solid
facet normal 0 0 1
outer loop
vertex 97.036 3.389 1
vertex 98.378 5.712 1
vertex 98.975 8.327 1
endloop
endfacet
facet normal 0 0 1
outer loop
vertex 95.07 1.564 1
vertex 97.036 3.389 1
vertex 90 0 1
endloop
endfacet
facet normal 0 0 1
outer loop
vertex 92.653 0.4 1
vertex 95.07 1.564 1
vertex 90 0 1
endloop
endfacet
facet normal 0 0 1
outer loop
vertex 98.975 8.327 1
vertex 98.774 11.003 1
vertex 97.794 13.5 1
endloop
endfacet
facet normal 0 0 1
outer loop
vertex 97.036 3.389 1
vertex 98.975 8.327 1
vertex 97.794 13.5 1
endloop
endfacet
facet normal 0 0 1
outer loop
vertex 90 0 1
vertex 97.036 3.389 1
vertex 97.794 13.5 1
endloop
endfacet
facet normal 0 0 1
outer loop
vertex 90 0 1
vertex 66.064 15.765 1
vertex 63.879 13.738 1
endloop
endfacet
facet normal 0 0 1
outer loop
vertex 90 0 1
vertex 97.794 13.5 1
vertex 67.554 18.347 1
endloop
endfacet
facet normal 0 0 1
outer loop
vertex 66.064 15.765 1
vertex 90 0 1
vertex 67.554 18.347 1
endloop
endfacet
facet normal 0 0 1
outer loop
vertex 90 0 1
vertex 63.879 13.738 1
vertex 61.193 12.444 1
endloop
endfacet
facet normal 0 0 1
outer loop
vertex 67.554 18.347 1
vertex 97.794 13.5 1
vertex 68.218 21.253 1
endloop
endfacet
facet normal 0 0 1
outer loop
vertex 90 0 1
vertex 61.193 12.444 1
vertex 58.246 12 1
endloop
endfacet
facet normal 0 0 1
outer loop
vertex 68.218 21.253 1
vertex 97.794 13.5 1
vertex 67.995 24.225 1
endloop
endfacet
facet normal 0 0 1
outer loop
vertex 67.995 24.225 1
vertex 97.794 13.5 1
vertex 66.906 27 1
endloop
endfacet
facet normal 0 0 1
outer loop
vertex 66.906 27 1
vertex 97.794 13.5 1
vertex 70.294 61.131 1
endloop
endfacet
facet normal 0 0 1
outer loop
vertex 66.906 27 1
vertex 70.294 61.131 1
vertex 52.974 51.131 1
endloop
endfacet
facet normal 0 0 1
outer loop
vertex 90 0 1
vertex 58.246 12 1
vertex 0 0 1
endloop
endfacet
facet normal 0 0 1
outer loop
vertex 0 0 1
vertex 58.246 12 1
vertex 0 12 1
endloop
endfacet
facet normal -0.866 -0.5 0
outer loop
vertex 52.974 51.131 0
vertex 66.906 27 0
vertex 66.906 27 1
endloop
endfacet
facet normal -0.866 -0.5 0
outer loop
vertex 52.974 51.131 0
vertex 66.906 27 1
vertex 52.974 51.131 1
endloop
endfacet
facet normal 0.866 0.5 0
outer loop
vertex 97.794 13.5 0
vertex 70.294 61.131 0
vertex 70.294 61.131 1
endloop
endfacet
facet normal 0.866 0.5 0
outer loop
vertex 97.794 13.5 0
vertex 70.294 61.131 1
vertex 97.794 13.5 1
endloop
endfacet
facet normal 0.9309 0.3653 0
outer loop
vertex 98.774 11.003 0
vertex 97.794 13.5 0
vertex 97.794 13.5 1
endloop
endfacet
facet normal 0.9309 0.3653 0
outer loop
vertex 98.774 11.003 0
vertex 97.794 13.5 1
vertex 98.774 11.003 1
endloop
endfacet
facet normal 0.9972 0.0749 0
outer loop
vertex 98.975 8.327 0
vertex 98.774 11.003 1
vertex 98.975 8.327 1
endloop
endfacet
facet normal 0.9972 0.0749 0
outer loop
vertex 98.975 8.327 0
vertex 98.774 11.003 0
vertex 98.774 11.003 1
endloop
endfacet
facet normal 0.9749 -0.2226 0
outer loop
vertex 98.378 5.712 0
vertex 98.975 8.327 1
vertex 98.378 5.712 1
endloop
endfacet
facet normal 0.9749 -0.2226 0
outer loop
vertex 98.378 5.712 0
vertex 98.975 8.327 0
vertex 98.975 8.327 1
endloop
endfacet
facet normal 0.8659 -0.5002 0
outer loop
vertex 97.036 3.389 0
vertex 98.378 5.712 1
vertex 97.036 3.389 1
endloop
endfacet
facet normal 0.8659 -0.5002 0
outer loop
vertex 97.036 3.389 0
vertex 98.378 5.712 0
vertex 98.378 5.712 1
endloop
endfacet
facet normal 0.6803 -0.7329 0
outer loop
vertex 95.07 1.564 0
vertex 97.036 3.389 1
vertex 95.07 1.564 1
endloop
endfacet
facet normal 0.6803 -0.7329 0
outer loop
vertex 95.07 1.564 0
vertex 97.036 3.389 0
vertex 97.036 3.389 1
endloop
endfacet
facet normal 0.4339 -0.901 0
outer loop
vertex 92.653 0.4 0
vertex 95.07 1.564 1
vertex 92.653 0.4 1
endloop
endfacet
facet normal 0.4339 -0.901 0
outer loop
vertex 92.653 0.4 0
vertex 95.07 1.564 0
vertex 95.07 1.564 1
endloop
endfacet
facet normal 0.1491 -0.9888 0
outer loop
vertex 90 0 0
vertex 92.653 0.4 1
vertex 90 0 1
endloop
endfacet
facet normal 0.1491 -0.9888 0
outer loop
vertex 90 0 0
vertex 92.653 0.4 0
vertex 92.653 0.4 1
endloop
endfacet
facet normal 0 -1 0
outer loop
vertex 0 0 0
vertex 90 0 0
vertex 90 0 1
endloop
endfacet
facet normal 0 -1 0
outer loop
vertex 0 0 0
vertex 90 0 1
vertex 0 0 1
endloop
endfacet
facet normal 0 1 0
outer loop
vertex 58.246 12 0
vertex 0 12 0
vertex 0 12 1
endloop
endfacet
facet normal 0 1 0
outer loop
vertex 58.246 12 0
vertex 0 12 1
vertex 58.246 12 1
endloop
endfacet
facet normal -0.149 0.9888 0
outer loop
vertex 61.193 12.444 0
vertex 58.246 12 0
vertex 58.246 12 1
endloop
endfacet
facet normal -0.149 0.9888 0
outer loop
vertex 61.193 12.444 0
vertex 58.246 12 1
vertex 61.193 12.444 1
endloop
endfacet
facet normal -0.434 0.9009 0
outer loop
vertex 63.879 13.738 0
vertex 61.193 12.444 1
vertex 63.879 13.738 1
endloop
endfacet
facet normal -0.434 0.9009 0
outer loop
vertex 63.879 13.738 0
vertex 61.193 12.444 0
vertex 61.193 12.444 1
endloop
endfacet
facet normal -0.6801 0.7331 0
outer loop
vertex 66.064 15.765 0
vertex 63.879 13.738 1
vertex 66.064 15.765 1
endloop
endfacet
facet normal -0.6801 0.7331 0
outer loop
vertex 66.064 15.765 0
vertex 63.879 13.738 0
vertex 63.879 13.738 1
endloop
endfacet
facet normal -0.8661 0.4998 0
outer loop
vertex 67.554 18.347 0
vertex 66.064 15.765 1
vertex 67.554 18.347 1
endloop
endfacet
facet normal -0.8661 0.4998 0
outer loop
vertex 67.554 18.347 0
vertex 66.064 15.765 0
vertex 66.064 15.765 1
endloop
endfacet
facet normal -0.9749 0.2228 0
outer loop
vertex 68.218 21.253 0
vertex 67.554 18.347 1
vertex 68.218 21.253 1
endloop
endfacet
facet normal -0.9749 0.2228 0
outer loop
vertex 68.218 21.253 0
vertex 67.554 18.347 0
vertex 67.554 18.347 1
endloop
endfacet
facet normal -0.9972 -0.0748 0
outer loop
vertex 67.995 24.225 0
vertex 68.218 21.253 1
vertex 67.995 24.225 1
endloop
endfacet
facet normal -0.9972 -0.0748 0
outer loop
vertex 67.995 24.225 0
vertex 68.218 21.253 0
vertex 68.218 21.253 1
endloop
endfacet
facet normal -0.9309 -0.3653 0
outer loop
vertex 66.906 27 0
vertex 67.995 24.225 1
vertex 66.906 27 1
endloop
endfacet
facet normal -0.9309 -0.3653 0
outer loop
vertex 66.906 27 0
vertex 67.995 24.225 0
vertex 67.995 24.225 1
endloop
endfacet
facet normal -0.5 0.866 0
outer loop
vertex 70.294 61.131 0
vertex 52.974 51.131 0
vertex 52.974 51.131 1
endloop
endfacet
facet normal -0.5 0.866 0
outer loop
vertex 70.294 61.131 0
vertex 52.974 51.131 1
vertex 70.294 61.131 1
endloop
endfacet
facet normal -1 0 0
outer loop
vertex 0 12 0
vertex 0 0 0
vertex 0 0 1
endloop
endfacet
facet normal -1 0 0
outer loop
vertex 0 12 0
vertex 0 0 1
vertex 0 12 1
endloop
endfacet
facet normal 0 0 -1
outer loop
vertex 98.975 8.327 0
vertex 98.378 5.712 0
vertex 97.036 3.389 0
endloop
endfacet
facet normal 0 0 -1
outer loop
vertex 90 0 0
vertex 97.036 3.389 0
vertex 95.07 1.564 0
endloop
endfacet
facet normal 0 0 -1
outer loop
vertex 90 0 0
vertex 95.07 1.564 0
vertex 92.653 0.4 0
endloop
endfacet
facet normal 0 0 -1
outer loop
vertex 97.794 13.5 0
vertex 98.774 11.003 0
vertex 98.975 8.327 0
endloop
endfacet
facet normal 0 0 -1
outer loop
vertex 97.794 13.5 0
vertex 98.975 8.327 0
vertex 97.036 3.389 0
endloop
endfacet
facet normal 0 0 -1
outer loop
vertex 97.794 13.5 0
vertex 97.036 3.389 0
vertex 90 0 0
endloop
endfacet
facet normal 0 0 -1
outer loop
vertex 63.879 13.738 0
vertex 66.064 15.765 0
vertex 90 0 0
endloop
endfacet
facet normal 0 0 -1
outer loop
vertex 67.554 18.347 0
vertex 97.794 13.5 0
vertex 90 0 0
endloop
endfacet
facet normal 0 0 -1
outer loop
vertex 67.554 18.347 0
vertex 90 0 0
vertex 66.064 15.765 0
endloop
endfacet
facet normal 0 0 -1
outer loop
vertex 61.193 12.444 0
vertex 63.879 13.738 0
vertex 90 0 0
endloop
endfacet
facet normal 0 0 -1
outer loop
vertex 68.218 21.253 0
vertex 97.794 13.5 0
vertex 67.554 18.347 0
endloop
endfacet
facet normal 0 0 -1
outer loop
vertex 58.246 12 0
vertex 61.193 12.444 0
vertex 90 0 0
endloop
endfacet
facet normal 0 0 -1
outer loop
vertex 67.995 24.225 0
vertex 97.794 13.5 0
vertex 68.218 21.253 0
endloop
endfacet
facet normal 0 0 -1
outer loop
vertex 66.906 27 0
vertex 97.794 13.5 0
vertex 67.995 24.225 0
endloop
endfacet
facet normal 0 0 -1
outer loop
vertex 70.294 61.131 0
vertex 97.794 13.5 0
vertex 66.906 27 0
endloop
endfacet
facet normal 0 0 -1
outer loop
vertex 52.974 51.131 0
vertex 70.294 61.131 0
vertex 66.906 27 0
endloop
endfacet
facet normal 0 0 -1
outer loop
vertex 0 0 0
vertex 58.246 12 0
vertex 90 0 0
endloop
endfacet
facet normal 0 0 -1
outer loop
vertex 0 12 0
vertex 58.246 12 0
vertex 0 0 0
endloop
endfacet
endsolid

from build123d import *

# Parameters (mm, degrees)
DODANIE_WYCI_GNI_CIE1_DEPTH = 1


with BuildPart() as part:
    # Szkic1 → Dodanie-wyciągnięcie1 (new body)
    with BuildSketch(Plane.XY):
        with BuildLine():
            Line((0, 0), (0, 12))
            Line((0, 12), (58.245735195, 12))
            ThreePointArc((58.245735195, 12), (66.905989232, 17), (66.905989232, 27))
            Line((66.905989232, 27), (52.973720558, 51.131397208))
            Line((52.973720558, 51.131397208), (70.294228634, 61.131397208))
            Line((70.294228634, 61.131397208), (97.794228634, 13.5))
            ThreePointArc((97.794228634, 13.5), (97.794228634, 4.5), (90, 0))
            Line((90, 0), (0, 0))
        make_face()
    extrude(amount=DODANIE_WYCI_GNI_CIE1_DEPTH)


solid = part.part
